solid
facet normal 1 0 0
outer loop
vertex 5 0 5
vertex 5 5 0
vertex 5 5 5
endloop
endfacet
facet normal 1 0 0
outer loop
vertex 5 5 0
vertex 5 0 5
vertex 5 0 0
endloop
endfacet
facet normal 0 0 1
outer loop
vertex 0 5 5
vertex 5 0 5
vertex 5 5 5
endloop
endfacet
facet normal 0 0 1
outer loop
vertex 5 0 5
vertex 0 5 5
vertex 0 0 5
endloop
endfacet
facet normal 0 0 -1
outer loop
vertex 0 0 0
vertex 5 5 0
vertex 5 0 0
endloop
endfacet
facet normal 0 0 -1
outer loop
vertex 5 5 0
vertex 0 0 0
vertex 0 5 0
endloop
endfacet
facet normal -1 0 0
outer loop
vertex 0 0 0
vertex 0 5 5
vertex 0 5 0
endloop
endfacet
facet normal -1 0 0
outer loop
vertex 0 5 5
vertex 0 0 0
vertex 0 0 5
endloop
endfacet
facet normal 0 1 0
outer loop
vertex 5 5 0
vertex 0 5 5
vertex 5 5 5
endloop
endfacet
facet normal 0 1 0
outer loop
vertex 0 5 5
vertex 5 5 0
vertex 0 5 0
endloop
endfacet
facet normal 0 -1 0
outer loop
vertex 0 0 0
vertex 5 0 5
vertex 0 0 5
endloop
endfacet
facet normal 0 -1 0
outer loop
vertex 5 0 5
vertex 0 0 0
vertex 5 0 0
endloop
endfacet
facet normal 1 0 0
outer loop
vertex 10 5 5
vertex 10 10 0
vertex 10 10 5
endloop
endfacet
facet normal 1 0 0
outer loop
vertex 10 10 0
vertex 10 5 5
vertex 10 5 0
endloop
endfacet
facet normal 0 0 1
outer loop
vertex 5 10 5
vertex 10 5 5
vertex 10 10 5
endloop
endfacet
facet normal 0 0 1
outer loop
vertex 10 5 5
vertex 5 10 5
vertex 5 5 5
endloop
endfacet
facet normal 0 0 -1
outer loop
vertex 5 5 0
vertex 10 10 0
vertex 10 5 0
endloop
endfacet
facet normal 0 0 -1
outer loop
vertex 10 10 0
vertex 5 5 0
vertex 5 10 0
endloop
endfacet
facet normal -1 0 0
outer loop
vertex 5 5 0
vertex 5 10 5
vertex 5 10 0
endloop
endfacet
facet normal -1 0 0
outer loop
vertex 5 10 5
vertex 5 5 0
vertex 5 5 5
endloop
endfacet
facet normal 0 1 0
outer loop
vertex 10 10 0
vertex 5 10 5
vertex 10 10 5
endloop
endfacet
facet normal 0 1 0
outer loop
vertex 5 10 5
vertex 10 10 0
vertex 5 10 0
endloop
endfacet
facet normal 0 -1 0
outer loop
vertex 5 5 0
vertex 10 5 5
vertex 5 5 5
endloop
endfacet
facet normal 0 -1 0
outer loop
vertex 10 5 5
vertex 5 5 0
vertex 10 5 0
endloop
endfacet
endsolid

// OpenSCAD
// two cubes touching along an edge only
cube(5);
translate([5, 5, 0]) cube(5);
